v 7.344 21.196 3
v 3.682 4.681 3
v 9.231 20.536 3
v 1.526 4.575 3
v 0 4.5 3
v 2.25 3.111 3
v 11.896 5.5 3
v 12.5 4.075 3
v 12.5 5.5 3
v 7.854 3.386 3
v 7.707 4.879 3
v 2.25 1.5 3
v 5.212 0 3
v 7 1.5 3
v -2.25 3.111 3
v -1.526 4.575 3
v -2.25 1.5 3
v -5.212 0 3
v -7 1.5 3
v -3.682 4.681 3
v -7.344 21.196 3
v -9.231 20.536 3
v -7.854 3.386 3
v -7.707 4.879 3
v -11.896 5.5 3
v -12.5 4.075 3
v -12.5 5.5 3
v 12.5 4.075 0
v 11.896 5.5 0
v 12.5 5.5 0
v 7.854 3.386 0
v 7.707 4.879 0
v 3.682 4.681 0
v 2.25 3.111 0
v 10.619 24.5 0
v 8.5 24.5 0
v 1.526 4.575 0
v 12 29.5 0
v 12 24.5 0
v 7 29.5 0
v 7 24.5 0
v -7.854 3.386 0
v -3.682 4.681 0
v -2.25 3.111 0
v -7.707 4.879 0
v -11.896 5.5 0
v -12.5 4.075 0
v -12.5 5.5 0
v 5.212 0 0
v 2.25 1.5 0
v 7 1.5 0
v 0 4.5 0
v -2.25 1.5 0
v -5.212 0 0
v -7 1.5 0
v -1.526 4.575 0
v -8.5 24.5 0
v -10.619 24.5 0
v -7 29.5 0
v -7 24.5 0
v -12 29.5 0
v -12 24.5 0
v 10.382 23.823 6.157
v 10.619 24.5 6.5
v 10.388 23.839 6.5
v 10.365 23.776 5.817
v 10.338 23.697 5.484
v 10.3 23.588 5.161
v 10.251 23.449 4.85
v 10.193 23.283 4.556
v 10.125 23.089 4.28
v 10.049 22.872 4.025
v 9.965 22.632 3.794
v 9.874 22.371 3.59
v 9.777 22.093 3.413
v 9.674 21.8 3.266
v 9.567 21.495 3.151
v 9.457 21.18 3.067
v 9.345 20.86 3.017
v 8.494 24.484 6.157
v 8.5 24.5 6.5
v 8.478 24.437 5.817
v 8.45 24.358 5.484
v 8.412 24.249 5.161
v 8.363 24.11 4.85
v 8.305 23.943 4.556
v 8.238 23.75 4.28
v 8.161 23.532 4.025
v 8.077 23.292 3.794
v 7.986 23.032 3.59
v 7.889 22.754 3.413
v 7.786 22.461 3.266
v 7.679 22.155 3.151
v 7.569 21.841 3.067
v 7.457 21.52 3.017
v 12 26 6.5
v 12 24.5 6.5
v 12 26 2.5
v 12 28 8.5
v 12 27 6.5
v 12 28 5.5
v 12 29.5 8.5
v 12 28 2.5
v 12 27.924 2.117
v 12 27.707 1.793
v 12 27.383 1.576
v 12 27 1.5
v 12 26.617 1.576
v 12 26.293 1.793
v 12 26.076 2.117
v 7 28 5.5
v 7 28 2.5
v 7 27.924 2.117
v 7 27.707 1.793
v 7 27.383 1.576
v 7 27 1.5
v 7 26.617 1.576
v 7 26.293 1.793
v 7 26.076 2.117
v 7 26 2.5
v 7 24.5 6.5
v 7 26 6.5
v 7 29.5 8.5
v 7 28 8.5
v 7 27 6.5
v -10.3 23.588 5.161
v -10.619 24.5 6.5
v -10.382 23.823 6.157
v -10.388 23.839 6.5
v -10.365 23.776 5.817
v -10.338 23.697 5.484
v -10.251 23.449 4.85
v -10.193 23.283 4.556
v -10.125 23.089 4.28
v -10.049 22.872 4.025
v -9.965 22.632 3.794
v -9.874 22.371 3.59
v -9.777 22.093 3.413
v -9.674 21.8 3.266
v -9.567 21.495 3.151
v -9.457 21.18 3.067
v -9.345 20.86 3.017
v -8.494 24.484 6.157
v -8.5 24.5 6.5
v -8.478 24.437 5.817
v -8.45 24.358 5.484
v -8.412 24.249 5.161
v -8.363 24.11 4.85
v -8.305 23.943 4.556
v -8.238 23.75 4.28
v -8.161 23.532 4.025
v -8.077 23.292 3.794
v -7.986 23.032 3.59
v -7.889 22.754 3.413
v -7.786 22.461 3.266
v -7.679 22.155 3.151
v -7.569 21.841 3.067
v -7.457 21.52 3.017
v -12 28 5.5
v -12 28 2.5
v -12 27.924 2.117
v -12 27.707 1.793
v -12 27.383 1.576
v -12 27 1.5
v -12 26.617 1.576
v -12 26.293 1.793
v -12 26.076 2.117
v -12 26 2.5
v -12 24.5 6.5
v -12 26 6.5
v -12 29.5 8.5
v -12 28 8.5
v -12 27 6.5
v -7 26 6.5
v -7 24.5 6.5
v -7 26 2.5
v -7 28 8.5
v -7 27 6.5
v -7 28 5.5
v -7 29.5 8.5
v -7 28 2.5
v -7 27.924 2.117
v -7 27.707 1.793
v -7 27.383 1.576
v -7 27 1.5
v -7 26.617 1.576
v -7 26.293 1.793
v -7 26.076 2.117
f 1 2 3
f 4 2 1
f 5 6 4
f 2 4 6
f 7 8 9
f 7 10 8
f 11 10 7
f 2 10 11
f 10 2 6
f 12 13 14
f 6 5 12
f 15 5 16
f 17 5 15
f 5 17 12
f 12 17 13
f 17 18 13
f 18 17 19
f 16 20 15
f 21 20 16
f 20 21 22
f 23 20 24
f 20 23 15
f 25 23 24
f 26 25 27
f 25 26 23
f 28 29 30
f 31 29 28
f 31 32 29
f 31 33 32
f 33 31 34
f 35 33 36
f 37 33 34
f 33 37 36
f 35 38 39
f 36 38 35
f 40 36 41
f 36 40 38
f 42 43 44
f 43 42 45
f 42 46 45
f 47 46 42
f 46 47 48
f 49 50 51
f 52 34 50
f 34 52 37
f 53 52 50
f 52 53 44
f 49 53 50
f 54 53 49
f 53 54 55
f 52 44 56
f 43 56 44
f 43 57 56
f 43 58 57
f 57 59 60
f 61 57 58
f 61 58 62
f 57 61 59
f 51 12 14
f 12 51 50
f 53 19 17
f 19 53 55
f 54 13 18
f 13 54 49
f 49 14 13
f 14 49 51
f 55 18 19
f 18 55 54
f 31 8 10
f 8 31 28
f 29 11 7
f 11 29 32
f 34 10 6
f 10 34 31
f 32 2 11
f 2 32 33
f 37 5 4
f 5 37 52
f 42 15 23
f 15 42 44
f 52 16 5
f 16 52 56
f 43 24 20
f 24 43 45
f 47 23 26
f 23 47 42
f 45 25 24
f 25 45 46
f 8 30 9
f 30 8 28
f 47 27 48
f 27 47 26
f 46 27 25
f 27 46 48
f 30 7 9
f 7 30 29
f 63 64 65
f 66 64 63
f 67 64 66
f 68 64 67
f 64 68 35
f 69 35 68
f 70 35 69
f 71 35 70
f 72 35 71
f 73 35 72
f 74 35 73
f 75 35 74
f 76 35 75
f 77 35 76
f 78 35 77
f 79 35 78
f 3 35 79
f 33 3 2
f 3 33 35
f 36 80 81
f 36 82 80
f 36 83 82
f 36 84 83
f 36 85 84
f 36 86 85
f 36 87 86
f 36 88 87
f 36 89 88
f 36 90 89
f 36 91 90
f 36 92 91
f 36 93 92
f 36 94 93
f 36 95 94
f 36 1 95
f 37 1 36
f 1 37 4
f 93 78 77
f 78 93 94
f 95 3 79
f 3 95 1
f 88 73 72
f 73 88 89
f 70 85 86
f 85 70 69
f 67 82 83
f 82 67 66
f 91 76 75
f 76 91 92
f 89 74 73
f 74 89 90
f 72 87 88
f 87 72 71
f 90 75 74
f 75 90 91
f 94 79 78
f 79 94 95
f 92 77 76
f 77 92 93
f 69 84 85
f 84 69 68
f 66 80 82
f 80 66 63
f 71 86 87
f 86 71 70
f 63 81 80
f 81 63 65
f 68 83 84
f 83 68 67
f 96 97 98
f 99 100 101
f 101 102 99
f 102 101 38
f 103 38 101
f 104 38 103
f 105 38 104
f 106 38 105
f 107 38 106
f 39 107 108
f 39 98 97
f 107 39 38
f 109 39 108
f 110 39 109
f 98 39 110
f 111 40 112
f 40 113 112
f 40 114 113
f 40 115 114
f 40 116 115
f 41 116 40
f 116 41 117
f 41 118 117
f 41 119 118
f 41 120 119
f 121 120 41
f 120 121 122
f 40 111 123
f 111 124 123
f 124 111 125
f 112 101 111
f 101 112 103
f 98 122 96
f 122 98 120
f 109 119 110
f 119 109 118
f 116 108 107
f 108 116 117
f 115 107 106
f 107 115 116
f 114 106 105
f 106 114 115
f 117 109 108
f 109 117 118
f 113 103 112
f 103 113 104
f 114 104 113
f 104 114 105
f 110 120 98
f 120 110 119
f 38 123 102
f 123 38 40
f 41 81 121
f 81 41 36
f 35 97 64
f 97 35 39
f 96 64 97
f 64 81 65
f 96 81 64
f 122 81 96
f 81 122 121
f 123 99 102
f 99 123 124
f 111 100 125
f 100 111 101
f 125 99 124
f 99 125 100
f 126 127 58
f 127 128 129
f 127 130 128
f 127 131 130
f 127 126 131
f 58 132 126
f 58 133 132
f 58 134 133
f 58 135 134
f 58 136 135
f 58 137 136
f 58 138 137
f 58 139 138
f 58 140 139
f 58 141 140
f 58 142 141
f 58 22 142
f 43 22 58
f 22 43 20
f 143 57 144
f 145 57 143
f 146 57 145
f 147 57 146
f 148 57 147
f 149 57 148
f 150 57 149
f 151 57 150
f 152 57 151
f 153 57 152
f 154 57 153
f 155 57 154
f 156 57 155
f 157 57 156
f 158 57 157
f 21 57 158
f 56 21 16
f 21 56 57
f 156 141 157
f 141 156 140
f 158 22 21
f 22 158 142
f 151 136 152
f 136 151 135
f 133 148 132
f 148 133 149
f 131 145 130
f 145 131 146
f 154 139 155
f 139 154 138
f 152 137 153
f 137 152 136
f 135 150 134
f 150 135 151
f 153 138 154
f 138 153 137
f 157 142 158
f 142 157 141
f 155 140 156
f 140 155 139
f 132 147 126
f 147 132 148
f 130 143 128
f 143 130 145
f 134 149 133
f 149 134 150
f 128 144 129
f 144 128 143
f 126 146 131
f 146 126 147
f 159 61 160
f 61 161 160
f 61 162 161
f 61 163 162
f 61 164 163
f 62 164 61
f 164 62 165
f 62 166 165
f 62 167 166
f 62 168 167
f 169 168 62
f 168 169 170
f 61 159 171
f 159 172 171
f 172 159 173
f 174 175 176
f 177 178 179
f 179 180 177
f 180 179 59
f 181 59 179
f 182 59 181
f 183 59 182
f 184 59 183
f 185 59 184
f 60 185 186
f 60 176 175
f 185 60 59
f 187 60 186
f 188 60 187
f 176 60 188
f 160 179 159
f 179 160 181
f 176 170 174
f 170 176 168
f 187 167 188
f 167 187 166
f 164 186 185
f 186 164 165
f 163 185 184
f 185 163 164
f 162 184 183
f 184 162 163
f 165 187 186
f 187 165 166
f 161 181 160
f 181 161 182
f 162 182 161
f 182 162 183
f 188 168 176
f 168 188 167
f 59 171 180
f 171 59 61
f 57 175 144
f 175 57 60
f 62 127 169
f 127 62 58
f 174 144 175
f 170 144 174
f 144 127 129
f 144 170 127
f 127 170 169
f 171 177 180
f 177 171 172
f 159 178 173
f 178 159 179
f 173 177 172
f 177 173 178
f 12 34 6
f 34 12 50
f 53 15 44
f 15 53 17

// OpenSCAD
// file: clipComponent.scad
/** 
 * Single Hook Upright Clip Component 
 * 
 * A generic clip with a hook on one side.
 * 
 * This component is the interface between the hairband and the rest
 * of the models. Intended to be printed in the upright position 
 * so keep anisotropy in mind.
 */

PADDING = 0.01; // Constant padding value extending negative volumes to fix z-fighting

module hookHead(hookHeight, hookProtrusion, hookBottomAngle, thickness) {
    linear_extrude(height=clipWidth)
        polygon(points=[[0,0], [0,hookHeight],
            [hookProtrusion, hookProtrusion / tan(hookBottomAngle)]]
        );
}

module cornerReinforcement(spaceBetweenWalls, clipWidth) {
    difference() {
        cube([clipWidth, spaceBetweenWalls, spaceBetweenWalls/2]);
        translate([-PADDING, spaceBetweenWalls/2, spaceBetweenWalls/2])
            rotate([0, 90, 0])
            scale([1, 1, 1 + (2 * PADDING)])
            cylinder(h=clipWidth, r=spaceBetweenWalls/2);
    }
}

module clipComponent(clipParmList) {
    clipWidth = clipParmList[0];
    frontWallHeight = clipParmList[1];
    frontWallThickness = clipParmList[2];
    spaceBetweenWalls = clipParmList[3];
    bottomThickness = clipParmList[4];
    backWallHeight = clipParmList[5];
    backWallThickness = clipParmList[6];
    hookHeight = clipParmList[7];
    hookProtusion = clipParmList[8];
    hookBottomAngle = clipParmList[9];
    
    if (hookBottomAngle > 45) echo("WARNING: The hook may require supports");
    
    // Front wall
    cube([clipWidth, frontWallThickness + spaceBetweenWalls + backWallThickness, bottomThickness]);
    // Bottom
    translate([0, 0, bottomThickness])
        cube([clipWidth, frontWallThickness, frontWallHeight]);
    // Back wall
    translate([0, frontWallThickness + spaceBetweenWalls, bottomThickness])
        cube([clipWidth, backWallThickness, backWallHeight]);
    // Add rounded corner reinforcement for wall bending during insertion into clip
    translate([0, frontWallThickness, bottomThickness])
        cornerReinforcement(spaceBetweenWalls, clipWidth);
    // Hook head
    translate([clipWidth, frontWallThickness + spaceBetweenWalls, backWallHeight + bottomThickness - hookHeight])
        rotate([90, 0, -90])
        hookHead(hookHeight, hookProtrusion, hookBottomAngle, clipWidth);
}

// --- Parameters ---
$fn = 16; // global variable controlling number of vertices in a cylinder

clipWidth = 5;

frontWallHeight = 5;
frontWallThickness = 1.5;

spaceBetweenWalls = 2;

bottomThickness = 1.5;
backWallHeight = 7;
backWallThickness = 1.5;

hookHeight = 3; // how much wall space the hook head occupies
hookProtrusion = 1; // how far out the hook head extends
hookBottomAngle = 45; // bottom angle of the hook off the wall (angle > 45 degrees may need supports)

clipParmList = [
    clipWidth, frontWallHeight, frontWallThickness, spaceBetweenWalls, bottomThickness,
    backWallHeight, backWallThickness, hookHeight, hookProtrusion, hookBottomAngle
];


clipComponent(clipParmList);
// main file
/**
 * Face Shield Sheet Holder
 * 
 * A face shield component that clips into a basic hairband and holds a
 * transparent sheet in place.
 * 
 * Meant to be clipped onto the front and sides of a hairband to suspend a transparent
 * sheet protector in front of the wearer. It is assumed there will be 3 attached to the
 * visor (1 in front and 2 on the sides).
 */

PADDING = 0.01; // Constant padding value extending negative volumes to fix z-fighting

use <clipComponent.scad>;

module frontBarTriangle(extrusionHeight, frontBarWidth, triangleLength) {
    linear_extrude(height=extrusionHeight)
        polygon(points=[[0, 0], [frontBarWidth, 0],[0, triangleLength]]);
}

module frontBar(extrusionHeight, frontBarParmList) {
    frontBarLength = frontBarParmList[0];
    frontBarWidth = frontBarParmList[1];
    frontBarSideAngle = frontBarParmList[2];
    
    triangleLength = frontBarWidth / tan(frontBarSideAngle);
    translate([triangleLength, 0, 0])
        cube([frontBarLength - (2 * triangleLength), frontBarWidth, extrusionHeight]);
    translate([frontBarLength - triangleLength, frontBarWidth, 0])
        rotate([0, 0, -90])
        frontBarTriangle(extrusionHeight, frontBarWidth, triangleLength);
    translate([triangleLength, frontBarWidth, extrusionHeight])
        rotate([0, 180, 90])
    frontBarTriangle(extrusionHeight, frontBarWidth, triangleLength);
}

function arcRadius(height, width) = (height / 2) + (pow(width, 2) / (8 * height));

module backBar(extrusionHeight, backBarParmList) {
    backBarLength = backBarParmList[0];
    backBarWidth = backBarParmList[1];
    backBarDeflection = backBarParmList[2];
    
    radius = arcRadius(backBarDeflection, backBarLength);
    intersection() {
        translate([0, radius + backBarWidth, 0])
            rotate_extrude(angle=-180, convexity=10)
                translate([radius, 0, 0])
                square([backBarWidth, extrusionHeight]);
        translate([-backBarLength/2, 0, 0])
            cube([backBarLength, backBarWidth + backBarDeflection, extrusionHeight]);
    }
}

module cornerSupport(radius, thickness) {
    difference() {
        cube([thickness, radius, radius]);
        translate([-PADDING, 0, radius])
            rotate([0, 90, 0])
            cylinder(r=radius, h=thickness + (2 * PADDING));
    }
}

function hypotenuseLength(x, y) = sqrt(pow(x, 2) + pow(y, 2));

module arm(extrusionHeight, armParmList, clipParmList, clipRotationAngle) {
    armsHorizontalDistance = armParmList[0];
    armsWidth = armParmList[1];
    armsBackBarGap = armParmList[2];
    armsClipGap = armParmList[3];
    
    clipWidth = clipParmList[0];
    clipFrontWallHeight = clipParmList[1];
    clipBottomThickness = clipParmList[4];
    clipFrontWallTotalHeight = clipFrontWallHeight + clipBottomThickness;
    
    hypotenuse = hypotenuseLength(armsClipGap - armsBackBarGap, armsHorizontalDistance);
    armAngle = atan((armsClipGap - armsBackBarGap) / armsHorizontalDistance);
    rotationGapCover = tan(armAngle) * armsWidth;
    
    totalClipRotation = clipRotationAngle + armAngle; // add armAngle to reset clip angle
    clipRotationGapCover = tan(totalClipRotation) * armsWidth;
    
    rotate([0, 0, -armAngle])
        translate([0, -rotationGapCover, 0])
        union() {
            cube([armsWidth, hypotenuse + rotationGapCover, extrusionHeight]);
            translate([0, 
                (hypotenuse + rotationGapCover) - (clipFrontWallTotalHeight - extrusionHeight),
                extrusionHeight])
                cornerSupport(clipFrontWallTotalHeight - extrusionHeight, armsWidth);
            translate([0, hypotenuse + rotationGapCover, 0])
                cube([armsWidth, clipRotationGapCover, clipFrontWallTotalHeight]);
            translate([0, hypotenuse + rotationGapCover, 0])
                rotate([0, 0, totalClipRotation] )
                translate([-clipWidth/2 + armsWidth/2, 0, 0])
                    clipComponent(clipParmList);
        }
}

module sheetHolder(extrusionHeight, frontBarParmList, spaceParmList, backBarParmList,
    armParmList, clipParmList, clipRotationAngle) {
    frontBarLength = frontBarParmList[0];
    frontBarWidth = frontBarParmList[1];
    
    spacerLength = spaceParmList[0];
    spacerWidth = spaceParmList[1];
    
    backBarWidth = backBarParmList[1];
    
    armsWidth = armParmList[1];
    armsBackBarGap = armParmList[2]; 
    
    // Front Bar
    translate([-frontBarLength/2, 0, 0])
        frontBar(extrusionHeight, frontBarParmList);
    // Spacer
    translate([-spacerLength/2, frontBarWidth, 0])
        cube([spacerLength, spacerWidth + backBarWidth / 2, extrusionHeight]);
    // Back Bar
    translate([0, frontBarWidth + spacerWidth, 0])
        backBar(extrusionHeight, backBarParmList);
    // Arms
    sumBarWidth = frontBarWidth + spacerWidth + backBarWidth;
    translate([armsBackBarGap/2, sumBarWidth, 0])
        arm(extrusionHeight, armParmList, clipParmList, clipRotationAngle);
    translate([-armsBackBarGap/2, sumBarWidth, 0])
        mirror([1, 0, 0])
        arm(extrusionHeight, armParmList, clipParmList, clipRotationAngle);
}

// --- Parameters ---
$fn = 64; // global variable controlling number of vertices in a cylinder

// Sheet Holder Parameters
sheetHolderHeight = 3;

frontBarLength = 14;
frontBarWidth = 1.5;
frontBarSideAngle = 40;

spacerLength = 4.5;
spacerWidth = 1.5;

backBarLength = 25;
backBarWidth = 1.5;
backBarDeflection = 1;

armsHorizontalDistance = 20;
armsWidth = 2;
armsBackBarGap = 3;
armsClipGap = 10;

frontBarParmList = [frontBarLength, frontBarWidth, frontBarSideAngle];
spaceParmList = [spacerLength, spacerWidth];
backBarParmList = [backBarLength, backBarWidth, backBarDeflection];
armParmList = [armsHorizontalDistance, armsWidth, armsBackBarGap, armsClipGap];

// Clip Component Parameters
clipWidth = 5;

frontWallHeight = 5;
frontWallThickness = 1.5;

spaceBetweenWalls = 2;
bottomThickness = 1.5;

backWallHeight = 7;
backWallThickness = 1.5;

hookHeight = 3; // how much back wall space the hook head occupies
hookProtrusion = 1; // how far out the hook head extends horizontally
hookBottomAngle = 45; // bottom angle of the hook off the wall (angle > 45 degrees may need supports)

clipParmList = [
    clipWidth, frontWallHeight, frontWallThickness, spaceBetweenWalls, bottomThickness,
    backWallHeight, backWallThickness, hookHeight, hookProtrusion, hookBottomAngle
];

// Integration Parameters
clipRotationAngle = 0;


sheetHolder(sheetHolderHeight, frontBarParmList, spaceParmList, backBarParmList,
    armParmList, clipParmList, clipRotationAngle);
